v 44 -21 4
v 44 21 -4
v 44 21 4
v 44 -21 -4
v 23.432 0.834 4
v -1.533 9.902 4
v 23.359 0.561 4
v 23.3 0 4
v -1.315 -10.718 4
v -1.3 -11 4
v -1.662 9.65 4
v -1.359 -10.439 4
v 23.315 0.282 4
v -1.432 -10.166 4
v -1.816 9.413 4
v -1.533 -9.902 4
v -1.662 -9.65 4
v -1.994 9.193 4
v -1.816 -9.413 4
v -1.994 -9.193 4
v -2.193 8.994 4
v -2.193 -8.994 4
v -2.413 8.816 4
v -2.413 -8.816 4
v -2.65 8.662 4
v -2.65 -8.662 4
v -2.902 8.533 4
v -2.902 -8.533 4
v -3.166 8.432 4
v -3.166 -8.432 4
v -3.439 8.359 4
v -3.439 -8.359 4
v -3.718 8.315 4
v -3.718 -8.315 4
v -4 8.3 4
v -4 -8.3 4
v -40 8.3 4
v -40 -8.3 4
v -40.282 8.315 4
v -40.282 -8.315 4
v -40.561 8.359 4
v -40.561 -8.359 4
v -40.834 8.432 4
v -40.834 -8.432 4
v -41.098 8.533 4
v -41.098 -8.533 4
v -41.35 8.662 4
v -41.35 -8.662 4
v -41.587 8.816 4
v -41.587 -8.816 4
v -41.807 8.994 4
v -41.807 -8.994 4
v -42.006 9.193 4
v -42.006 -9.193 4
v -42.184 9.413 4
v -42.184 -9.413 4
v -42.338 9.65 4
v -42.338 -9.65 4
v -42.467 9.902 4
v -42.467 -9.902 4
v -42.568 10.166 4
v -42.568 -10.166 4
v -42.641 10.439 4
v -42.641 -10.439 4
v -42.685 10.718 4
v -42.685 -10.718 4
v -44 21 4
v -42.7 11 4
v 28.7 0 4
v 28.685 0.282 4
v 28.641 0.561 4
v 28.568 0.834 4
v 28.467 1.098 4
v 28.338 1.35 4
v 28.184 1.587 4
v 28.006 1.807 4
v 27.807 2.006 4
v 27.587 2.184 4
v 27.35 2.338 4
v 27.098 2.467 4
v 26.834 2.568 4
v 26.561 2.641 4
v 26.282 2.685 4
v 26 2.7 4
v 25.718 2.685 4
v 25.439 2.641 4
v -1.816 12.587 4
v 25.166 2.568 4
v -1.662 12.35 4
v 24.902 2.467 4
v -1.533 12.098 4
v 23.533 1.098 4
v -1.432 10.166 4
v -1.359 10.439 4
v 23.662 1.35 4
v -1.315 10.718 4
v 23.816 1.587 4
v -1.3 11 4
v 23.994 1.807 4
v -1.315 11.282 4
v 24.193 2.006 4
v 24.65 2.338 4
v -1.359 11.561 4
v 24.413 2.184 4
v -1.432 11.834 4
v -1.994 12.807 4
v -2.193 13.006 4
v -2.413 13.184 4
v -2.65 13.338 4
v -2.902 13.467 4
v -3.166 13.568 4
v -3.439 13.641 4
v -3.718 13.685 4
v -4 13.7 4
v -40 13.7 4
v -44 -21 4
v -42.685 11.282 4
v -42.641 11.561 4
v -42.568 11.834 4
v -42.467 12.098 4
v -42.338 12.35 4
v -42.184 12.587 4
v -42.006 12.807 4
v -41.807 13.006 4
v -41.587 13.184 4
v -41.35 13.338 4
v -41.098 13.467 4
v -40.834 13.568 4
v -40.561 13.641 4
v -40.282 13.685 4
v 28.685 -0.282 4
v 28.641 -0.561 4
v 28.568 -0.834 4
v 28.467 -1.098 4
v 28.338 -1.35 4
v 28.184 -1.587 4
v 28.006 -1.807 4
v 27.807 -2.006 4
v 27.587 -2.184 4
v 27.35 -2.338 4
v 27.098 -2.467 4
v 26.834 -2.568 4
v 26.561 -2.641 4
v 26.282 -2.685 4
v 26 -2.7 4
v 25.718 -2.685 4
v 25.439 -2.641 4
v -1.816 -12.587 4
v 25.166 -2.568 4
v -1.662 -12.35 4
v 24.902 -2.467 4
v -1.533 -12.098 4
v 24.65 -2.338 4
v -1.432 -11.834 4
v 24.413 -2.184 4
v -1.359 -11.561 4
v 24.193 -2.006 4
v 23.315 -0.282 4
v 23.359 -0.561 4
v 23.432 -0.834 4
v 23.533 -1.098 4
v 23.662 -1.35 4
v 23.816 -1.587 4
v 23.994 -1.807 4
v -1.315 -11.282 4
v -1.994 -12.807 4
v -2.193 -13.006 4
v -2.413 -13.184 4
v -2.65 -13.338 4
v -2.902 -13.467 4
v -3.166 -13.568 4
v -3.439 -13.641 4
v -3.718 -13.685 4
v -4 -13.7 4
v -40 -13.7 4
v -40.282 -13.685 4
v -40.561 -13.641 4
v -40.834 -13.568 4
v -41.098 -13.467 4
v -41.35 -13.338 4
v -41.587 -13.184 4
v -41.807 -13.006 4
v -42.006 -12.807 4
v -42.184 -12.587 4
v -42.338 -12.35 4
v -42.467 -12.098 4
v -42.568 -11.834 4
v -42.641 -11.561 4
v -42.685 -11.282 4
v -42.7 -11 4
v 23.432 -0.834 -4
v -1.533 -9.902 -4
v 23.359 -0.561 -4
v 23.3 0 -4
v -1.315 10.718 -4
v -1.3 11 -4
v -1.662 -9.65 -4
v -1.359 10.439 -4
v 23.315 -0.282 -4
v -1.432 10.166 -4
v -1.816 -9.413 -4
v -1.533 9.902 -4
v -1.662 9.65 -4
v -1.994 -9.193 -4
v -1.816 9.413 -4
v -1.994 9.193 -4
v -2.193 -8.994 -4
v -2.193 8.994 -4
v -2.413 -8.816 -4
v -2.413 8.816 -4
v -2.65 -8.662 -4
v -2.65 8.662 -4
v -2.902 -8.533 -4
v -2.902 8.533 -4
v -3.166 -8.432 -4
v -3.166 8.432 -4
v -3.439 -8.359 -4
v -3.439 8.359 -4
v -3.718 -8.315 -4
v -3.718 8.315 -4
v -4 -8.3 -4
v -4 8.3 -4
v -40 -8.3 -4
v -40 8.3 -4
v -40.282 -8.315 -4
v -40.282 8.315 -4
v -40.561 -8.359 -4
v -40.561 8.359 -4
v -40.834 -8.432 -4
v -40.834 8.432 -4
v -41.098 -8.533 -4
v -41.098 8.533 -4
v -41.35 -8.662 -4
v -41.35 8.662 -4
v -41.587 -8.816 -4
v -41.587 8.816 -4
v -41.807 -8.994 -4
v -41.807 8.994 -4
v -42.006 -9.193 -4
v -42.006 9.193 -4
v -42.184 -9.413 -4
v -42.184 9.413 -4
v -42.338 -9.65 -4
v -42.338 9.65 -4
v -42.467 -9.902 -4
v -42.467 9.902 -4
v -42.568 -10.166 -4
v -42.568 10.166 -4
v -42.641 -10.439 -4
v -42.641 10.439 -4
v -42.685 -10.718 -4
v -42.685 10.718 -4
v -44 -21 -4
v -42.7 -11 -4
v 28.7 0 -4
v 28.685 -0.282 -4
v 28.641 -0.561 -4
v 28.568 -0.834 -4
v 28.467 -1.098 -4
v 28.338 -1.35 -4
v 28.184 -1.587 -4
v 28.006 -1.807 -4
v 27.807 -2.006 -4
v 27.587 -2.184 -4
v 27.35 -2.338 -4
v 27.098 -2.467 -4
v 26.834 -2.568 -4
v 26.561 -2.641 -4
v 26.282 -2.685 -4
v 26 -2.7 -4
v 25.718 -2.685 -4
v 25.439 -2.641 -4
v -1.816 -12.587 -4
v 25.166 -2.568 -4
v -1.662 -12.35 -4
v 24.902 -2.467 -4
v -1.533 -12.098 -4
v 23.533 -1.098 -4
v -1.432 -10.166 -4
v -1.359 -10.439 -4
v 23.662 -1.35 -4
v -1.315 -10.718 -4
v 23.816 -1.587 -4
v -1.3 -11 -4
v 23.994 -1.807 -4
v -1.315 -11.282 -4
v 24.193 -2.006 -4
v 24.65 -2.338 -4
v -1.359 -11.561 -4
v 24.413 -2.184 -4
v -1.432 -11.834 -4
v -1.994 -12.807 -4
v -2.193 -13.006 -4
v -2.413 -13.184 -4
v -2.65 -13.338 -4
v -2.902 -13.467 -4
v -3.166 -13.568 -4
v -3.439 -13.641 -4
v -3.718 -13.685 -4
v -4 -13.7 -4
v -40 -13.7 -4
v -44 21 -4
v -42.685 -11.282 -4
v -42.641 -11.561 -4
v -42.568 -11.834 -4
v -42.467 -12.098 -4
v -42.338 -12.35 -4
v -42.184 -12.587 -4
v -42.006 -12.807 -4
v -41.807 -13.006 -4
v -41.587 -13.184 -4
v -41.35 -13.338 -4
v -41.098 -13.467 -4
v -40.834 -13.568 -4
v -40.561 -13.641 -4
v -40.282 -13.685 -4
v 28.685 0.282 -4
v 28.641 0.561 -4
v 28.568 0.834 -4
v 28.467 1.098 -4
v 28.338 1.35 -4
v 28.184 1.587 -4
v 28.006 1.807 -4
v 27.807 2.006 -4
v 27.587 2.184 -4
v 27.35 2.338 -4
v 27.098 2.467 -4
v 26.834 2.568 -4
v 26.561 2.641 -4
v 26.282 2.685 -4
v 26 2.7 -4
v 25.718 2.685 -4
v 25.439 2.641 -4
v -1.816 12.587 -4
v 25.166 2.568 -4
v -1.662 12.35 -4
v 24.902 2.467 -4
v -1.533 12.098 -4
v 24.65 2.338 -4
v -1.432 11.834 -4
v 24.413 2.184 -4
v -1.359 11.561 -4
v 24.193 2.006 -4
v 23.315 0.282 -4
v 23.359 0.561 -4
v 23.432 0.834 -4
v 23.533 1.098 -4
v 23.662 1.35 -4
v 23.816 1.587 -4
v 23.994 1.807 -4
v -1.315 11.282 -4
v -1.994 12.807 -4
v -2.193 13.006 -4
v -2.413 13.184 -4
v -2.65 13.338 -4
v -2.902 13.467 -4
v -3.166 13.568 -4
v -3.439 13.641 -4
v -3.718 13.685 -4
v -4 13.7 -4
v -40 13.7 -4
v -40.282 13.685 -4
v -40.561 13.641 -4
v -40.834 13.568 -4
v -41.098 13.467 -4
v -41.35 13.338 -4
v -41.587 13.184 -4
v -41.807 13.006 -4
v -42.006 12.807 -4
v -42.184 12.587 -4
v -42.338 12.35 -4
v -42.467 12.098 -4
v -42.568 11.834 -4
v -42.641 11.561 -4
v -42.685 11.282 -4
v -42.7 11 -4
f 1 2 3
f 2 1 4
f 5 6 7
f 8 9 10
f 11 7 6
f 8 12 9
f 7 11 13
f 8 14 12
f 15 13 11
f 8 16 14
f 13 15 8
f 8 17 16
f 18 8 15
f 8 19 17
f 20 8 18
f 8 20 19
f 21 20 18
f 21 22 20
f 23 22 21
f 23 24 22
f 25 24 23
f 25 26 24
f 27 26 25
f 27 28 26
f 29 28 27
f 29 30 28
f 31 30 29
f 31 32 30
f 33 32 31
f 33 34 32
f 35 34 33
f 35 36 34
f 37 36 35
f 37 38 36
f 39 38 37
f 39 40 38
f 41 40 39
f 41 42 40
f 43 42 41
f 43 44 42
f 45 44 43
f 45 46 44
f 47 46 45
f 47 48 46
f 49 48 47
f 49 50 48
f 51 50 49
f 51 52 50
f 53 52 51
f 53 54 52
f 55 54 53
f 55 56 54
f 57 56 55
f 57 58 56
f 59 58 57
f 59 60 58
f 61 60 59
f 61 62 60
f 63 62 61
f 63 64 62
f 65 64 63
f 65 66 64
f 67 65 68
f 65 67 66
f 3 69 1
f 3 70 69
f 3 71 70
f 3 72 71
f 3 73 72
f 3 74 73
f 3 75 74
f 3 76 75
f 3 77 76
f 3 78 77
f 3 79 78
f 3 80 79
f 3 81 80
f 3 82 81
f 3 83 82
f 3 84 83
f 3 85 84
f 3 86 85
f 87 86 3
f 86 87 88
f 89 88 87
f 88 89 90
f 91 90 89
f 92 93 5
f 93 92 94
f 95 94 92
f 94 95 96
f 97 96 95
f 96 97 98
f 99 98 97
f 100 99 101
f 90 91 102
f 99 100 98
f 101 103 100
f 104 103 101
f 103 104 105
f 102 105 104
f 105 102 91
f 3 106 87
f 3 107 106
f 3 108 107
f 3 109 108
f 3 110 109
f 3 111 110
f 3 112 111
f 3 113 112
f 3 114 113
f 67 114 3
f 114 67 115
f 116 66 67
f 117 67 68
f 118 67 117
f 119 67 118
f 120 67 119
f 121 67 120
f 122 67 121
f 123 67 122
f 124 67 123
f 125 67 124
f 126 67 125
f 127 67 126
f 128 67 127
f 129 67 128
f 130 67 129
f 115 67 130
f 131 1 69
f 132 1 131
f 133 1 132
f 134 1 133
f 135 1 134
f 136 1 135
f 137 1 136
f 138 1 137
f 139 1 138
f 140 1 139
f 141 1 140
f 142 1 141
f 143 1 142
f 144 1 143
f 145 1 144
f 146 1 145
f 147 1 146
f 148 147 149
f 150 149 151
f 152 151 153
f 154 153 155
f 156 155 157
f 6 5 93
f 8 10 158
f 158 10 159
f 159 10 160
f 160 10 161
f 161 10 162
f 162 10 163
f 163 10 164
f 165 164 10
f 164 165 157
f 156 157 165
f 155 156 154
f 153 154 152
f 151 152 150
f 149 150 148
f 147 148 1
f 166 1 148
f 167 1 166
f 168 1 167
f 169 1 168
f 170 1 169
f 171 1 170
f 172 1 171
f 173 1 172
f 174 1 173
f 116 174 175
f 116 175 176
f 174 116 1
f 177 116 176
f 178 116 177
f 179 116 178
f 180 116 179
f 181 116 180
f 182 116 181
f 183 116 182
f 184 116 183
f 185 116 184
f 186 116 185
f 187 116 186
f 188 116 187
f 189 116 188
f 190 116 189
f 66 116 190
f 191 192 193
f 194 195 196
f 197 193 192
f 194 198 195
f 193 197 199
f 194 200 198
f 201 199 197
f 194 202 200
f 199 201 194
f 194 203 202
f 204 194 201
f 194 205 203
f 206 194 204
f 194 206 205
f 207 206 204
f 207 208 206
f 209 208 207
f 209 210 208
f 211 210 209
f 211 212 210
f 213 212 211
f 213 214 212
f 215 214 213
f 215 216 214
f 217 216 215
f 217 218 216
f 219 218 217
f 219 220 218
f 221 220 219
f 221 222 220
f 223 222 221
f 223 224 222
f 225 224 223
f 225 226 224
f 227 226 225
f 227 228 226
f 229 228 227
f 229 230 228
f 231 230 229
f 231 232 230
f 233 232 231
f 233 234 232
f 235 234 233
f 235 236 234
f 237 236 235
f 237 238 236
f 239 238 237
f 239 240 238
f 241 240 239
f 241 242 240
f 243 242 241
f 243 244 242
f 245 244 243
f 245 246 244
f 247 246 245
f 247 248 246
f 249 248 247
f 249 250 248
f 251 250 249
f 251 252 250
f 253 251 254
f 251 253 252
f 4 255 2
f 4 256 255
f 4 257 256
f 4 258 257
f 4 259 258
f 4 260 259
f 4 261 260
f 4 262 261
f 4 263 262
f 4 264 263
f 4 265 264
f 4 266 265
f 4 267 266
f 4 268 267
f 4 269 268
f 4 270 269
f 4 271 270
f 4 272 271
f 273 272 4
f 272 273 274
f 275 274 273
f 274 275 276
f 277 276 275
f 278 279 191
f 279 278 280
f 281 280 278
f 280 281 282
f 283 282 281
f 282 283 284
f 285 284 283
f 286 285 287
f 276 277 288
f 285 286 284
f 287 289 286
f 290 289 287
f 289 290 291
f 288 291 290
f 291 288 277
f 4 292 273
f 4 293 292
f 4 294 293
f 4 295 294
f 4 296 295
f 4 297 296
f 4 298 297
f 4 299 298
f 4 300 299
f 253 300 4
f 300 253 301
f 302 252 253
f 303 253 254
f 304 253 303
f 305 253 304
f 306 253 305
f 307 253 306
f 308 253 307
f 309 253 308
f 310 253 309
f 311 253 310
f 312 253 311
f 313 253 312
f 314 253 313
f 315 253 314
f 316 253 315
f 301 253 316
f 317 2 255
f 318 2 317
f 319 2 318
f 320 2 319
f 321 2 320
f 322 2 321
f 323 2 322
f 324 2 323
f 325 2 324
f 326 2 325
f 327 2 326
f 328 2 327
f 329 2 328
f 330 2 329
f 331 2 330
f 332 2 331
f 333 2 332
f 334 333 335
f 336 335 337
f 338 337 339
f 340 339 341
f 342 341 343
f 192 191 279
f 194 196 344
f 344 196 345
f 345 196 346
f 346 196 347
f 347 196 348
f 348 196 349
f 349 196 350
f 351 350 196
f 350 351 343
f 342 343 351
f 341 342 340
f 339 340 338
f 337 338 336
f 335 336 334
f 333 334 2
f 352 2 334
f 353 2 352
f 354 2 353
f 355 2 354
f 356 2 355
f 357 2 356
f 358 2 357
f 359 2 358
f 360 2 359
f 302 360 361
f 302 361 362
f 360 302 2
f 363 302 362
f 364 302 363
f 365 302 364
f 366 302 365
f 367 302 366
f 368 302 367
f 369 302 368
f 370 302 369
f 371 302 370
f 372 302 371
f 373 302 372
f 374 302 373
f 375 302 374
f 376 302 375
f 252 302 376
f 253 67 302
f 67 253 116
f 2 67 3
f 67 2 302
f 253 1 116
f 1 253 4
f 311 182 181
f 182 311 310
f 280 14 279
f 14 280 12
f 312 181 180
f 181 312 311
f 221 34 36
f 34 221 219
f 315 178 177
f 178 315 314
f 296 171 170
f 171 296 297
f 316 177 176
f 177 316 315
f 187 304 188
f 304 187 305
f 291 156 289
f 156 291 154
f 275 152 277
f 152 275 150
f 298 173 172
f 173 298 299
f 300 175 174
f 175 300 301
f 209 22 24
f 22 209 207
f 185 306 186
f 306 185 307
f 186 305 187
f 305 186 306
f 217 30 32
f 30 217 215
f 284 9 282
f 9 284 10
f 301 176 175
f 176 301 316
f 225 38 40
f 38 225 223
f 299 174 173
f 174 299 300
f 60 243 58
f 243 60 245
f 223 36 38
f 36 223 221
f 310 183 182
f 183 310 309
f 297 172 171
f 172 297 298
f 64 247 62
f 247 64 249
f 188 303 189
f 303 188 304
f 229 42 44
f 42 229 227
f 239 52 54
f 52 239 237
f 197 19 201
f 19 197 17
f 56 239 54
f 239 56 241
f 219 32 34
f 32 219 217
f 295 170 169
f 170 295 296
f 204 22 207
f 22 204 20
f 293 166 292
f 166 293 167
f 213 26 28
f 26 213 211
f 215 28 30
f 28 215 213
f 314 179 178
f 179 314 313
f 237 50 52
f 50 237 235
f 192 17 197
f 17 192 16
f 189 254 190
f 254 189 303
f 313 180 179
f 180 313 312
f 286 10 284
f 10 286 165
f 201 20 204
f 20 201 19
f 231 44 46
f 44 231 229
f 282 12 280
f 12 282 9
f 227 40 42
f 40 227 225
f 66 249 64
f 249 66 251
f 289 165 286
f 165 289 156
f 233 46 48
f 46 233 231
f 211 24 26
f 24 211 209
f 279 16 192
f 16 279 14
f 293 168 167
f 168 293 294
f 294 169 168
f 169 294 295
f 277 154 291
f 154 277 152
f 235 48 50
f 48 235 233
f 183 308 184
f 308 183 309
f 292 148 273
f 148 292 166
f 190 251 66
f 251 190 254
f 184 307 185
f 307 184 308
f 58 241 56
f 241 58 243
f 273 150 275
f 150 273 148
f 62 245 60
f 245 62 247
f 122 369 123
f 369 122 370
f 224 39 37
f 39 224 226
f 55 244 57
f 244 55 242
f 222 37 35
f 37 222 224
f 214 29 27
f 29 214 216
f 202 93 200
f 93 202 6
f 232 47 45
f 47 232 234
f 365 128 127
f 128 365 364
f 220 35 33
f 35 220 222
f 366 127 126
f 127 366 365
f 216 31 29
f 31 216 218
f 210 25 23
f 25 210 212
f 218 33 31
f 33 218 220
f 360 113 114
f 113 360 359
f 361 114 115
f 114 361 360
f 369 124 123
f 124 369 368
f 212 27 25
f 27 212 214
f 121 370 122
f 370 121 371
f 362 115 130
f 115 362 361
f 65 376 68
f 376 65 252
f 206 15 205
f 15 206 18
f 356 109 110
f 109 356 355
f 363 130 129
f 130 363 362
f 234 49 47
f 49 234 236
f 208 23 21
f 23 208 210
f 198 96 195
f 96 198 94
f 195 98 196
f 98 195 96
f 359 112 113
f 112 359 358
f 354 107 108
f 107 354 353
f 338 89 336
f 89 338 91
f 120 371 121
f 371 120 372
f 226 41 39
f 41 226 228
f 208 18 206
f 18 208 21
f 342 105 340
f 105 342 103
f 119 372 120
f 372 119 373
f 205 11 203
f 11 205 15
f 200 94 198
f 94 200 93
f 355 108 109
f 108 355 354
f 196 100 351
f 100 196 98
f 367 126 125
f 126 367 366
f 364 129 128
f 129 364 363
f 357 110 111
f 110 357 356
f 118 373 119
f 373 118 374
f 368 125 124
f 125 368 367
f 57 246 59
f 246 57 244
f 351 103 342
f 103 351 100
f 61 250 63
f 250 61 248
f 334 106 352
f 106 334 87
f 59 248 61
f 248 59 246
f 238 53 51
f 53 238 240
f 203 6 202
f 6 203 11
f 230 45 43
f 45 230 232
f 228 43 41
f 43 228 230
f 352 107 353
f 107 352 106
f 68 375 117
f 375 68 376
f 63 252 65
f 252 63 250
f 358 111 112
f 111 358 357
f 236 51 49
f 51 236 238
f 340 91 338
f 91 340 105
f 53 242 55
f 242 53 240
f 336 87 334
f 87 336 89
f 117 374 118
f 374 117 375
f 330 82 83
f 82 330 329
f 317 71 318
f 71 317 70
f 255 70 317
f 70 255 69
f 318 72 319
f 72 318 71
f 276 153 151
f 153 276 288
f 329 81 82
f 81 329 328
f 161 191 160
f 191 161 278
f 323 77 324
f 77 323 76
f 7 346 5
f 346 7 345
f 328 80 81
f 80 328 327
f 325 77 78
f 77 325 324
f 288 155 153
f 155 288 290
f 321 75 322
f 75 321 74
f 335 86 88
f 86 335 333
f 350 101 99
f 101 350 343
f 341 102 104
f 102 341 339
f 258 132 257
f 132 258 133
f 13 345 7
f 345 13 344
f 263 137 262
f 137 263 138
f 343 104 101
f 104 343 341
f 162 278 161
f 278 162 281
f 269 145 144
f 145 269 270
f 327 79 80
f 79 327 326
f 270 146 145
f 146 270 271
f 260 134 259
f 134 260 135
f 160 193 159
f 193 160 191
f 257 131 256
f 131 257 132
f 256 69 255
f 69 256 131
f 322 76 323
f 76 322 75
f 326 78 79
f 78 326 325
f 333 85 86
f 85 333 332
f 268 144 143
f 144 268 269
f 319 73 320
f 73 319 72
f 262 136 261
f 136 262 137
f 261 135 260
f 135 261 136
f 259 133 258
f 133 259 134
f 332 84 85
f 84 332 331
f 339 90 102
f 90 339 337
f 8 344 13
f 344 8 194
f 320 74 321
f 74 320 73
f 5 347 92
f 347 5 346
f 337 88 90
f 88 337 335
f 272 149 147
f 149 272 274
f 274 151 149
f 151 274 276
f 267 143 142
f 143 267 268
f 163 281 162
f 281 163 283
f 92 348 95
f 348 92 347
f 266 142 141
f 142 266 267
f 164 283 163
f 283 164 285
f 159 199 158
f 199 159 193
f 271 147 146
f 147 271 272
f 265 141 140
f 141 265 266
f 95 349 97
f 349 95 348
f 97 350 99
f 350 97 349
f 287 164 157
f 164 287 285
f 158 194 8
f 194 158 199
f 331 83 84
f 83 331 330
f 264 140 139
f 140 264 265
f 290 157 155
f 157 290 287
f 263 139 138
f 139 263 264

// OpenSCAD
// GT2 idler tensioner slide for 6 mm belt.
$fn = 60;
eps = 0.02;
slide_l = 88;
slide_w = 42;
slide_t = 8;
belt_w = 6;
slot_l = 36;
axle_d = 5.4;
axle_x = slide_l / 2 - 18;
module slot(y) {
    hull() {
        translate([-slide_l / 4 - slot_l / 2, y, -slide_t / 2 - eps]) cylinder(d = 5.4, h = slide_t + 2 * eps);
        translate([-slide_l / 4 + slot_l / 2, y, -slide_t / 2 - eps]) cylinder(d = 5.4, h = slide_t + 2 * eps);
    }
}
difference() {
    cube([slide_l, slide_w, slide_t], center = true);
    slot(-11);
    slot(11);
    translate([axle_x, 0, -slide_t / 2 - eps]) cylinder(d = axle_d, h = slide_t + 2 * eps);
}
